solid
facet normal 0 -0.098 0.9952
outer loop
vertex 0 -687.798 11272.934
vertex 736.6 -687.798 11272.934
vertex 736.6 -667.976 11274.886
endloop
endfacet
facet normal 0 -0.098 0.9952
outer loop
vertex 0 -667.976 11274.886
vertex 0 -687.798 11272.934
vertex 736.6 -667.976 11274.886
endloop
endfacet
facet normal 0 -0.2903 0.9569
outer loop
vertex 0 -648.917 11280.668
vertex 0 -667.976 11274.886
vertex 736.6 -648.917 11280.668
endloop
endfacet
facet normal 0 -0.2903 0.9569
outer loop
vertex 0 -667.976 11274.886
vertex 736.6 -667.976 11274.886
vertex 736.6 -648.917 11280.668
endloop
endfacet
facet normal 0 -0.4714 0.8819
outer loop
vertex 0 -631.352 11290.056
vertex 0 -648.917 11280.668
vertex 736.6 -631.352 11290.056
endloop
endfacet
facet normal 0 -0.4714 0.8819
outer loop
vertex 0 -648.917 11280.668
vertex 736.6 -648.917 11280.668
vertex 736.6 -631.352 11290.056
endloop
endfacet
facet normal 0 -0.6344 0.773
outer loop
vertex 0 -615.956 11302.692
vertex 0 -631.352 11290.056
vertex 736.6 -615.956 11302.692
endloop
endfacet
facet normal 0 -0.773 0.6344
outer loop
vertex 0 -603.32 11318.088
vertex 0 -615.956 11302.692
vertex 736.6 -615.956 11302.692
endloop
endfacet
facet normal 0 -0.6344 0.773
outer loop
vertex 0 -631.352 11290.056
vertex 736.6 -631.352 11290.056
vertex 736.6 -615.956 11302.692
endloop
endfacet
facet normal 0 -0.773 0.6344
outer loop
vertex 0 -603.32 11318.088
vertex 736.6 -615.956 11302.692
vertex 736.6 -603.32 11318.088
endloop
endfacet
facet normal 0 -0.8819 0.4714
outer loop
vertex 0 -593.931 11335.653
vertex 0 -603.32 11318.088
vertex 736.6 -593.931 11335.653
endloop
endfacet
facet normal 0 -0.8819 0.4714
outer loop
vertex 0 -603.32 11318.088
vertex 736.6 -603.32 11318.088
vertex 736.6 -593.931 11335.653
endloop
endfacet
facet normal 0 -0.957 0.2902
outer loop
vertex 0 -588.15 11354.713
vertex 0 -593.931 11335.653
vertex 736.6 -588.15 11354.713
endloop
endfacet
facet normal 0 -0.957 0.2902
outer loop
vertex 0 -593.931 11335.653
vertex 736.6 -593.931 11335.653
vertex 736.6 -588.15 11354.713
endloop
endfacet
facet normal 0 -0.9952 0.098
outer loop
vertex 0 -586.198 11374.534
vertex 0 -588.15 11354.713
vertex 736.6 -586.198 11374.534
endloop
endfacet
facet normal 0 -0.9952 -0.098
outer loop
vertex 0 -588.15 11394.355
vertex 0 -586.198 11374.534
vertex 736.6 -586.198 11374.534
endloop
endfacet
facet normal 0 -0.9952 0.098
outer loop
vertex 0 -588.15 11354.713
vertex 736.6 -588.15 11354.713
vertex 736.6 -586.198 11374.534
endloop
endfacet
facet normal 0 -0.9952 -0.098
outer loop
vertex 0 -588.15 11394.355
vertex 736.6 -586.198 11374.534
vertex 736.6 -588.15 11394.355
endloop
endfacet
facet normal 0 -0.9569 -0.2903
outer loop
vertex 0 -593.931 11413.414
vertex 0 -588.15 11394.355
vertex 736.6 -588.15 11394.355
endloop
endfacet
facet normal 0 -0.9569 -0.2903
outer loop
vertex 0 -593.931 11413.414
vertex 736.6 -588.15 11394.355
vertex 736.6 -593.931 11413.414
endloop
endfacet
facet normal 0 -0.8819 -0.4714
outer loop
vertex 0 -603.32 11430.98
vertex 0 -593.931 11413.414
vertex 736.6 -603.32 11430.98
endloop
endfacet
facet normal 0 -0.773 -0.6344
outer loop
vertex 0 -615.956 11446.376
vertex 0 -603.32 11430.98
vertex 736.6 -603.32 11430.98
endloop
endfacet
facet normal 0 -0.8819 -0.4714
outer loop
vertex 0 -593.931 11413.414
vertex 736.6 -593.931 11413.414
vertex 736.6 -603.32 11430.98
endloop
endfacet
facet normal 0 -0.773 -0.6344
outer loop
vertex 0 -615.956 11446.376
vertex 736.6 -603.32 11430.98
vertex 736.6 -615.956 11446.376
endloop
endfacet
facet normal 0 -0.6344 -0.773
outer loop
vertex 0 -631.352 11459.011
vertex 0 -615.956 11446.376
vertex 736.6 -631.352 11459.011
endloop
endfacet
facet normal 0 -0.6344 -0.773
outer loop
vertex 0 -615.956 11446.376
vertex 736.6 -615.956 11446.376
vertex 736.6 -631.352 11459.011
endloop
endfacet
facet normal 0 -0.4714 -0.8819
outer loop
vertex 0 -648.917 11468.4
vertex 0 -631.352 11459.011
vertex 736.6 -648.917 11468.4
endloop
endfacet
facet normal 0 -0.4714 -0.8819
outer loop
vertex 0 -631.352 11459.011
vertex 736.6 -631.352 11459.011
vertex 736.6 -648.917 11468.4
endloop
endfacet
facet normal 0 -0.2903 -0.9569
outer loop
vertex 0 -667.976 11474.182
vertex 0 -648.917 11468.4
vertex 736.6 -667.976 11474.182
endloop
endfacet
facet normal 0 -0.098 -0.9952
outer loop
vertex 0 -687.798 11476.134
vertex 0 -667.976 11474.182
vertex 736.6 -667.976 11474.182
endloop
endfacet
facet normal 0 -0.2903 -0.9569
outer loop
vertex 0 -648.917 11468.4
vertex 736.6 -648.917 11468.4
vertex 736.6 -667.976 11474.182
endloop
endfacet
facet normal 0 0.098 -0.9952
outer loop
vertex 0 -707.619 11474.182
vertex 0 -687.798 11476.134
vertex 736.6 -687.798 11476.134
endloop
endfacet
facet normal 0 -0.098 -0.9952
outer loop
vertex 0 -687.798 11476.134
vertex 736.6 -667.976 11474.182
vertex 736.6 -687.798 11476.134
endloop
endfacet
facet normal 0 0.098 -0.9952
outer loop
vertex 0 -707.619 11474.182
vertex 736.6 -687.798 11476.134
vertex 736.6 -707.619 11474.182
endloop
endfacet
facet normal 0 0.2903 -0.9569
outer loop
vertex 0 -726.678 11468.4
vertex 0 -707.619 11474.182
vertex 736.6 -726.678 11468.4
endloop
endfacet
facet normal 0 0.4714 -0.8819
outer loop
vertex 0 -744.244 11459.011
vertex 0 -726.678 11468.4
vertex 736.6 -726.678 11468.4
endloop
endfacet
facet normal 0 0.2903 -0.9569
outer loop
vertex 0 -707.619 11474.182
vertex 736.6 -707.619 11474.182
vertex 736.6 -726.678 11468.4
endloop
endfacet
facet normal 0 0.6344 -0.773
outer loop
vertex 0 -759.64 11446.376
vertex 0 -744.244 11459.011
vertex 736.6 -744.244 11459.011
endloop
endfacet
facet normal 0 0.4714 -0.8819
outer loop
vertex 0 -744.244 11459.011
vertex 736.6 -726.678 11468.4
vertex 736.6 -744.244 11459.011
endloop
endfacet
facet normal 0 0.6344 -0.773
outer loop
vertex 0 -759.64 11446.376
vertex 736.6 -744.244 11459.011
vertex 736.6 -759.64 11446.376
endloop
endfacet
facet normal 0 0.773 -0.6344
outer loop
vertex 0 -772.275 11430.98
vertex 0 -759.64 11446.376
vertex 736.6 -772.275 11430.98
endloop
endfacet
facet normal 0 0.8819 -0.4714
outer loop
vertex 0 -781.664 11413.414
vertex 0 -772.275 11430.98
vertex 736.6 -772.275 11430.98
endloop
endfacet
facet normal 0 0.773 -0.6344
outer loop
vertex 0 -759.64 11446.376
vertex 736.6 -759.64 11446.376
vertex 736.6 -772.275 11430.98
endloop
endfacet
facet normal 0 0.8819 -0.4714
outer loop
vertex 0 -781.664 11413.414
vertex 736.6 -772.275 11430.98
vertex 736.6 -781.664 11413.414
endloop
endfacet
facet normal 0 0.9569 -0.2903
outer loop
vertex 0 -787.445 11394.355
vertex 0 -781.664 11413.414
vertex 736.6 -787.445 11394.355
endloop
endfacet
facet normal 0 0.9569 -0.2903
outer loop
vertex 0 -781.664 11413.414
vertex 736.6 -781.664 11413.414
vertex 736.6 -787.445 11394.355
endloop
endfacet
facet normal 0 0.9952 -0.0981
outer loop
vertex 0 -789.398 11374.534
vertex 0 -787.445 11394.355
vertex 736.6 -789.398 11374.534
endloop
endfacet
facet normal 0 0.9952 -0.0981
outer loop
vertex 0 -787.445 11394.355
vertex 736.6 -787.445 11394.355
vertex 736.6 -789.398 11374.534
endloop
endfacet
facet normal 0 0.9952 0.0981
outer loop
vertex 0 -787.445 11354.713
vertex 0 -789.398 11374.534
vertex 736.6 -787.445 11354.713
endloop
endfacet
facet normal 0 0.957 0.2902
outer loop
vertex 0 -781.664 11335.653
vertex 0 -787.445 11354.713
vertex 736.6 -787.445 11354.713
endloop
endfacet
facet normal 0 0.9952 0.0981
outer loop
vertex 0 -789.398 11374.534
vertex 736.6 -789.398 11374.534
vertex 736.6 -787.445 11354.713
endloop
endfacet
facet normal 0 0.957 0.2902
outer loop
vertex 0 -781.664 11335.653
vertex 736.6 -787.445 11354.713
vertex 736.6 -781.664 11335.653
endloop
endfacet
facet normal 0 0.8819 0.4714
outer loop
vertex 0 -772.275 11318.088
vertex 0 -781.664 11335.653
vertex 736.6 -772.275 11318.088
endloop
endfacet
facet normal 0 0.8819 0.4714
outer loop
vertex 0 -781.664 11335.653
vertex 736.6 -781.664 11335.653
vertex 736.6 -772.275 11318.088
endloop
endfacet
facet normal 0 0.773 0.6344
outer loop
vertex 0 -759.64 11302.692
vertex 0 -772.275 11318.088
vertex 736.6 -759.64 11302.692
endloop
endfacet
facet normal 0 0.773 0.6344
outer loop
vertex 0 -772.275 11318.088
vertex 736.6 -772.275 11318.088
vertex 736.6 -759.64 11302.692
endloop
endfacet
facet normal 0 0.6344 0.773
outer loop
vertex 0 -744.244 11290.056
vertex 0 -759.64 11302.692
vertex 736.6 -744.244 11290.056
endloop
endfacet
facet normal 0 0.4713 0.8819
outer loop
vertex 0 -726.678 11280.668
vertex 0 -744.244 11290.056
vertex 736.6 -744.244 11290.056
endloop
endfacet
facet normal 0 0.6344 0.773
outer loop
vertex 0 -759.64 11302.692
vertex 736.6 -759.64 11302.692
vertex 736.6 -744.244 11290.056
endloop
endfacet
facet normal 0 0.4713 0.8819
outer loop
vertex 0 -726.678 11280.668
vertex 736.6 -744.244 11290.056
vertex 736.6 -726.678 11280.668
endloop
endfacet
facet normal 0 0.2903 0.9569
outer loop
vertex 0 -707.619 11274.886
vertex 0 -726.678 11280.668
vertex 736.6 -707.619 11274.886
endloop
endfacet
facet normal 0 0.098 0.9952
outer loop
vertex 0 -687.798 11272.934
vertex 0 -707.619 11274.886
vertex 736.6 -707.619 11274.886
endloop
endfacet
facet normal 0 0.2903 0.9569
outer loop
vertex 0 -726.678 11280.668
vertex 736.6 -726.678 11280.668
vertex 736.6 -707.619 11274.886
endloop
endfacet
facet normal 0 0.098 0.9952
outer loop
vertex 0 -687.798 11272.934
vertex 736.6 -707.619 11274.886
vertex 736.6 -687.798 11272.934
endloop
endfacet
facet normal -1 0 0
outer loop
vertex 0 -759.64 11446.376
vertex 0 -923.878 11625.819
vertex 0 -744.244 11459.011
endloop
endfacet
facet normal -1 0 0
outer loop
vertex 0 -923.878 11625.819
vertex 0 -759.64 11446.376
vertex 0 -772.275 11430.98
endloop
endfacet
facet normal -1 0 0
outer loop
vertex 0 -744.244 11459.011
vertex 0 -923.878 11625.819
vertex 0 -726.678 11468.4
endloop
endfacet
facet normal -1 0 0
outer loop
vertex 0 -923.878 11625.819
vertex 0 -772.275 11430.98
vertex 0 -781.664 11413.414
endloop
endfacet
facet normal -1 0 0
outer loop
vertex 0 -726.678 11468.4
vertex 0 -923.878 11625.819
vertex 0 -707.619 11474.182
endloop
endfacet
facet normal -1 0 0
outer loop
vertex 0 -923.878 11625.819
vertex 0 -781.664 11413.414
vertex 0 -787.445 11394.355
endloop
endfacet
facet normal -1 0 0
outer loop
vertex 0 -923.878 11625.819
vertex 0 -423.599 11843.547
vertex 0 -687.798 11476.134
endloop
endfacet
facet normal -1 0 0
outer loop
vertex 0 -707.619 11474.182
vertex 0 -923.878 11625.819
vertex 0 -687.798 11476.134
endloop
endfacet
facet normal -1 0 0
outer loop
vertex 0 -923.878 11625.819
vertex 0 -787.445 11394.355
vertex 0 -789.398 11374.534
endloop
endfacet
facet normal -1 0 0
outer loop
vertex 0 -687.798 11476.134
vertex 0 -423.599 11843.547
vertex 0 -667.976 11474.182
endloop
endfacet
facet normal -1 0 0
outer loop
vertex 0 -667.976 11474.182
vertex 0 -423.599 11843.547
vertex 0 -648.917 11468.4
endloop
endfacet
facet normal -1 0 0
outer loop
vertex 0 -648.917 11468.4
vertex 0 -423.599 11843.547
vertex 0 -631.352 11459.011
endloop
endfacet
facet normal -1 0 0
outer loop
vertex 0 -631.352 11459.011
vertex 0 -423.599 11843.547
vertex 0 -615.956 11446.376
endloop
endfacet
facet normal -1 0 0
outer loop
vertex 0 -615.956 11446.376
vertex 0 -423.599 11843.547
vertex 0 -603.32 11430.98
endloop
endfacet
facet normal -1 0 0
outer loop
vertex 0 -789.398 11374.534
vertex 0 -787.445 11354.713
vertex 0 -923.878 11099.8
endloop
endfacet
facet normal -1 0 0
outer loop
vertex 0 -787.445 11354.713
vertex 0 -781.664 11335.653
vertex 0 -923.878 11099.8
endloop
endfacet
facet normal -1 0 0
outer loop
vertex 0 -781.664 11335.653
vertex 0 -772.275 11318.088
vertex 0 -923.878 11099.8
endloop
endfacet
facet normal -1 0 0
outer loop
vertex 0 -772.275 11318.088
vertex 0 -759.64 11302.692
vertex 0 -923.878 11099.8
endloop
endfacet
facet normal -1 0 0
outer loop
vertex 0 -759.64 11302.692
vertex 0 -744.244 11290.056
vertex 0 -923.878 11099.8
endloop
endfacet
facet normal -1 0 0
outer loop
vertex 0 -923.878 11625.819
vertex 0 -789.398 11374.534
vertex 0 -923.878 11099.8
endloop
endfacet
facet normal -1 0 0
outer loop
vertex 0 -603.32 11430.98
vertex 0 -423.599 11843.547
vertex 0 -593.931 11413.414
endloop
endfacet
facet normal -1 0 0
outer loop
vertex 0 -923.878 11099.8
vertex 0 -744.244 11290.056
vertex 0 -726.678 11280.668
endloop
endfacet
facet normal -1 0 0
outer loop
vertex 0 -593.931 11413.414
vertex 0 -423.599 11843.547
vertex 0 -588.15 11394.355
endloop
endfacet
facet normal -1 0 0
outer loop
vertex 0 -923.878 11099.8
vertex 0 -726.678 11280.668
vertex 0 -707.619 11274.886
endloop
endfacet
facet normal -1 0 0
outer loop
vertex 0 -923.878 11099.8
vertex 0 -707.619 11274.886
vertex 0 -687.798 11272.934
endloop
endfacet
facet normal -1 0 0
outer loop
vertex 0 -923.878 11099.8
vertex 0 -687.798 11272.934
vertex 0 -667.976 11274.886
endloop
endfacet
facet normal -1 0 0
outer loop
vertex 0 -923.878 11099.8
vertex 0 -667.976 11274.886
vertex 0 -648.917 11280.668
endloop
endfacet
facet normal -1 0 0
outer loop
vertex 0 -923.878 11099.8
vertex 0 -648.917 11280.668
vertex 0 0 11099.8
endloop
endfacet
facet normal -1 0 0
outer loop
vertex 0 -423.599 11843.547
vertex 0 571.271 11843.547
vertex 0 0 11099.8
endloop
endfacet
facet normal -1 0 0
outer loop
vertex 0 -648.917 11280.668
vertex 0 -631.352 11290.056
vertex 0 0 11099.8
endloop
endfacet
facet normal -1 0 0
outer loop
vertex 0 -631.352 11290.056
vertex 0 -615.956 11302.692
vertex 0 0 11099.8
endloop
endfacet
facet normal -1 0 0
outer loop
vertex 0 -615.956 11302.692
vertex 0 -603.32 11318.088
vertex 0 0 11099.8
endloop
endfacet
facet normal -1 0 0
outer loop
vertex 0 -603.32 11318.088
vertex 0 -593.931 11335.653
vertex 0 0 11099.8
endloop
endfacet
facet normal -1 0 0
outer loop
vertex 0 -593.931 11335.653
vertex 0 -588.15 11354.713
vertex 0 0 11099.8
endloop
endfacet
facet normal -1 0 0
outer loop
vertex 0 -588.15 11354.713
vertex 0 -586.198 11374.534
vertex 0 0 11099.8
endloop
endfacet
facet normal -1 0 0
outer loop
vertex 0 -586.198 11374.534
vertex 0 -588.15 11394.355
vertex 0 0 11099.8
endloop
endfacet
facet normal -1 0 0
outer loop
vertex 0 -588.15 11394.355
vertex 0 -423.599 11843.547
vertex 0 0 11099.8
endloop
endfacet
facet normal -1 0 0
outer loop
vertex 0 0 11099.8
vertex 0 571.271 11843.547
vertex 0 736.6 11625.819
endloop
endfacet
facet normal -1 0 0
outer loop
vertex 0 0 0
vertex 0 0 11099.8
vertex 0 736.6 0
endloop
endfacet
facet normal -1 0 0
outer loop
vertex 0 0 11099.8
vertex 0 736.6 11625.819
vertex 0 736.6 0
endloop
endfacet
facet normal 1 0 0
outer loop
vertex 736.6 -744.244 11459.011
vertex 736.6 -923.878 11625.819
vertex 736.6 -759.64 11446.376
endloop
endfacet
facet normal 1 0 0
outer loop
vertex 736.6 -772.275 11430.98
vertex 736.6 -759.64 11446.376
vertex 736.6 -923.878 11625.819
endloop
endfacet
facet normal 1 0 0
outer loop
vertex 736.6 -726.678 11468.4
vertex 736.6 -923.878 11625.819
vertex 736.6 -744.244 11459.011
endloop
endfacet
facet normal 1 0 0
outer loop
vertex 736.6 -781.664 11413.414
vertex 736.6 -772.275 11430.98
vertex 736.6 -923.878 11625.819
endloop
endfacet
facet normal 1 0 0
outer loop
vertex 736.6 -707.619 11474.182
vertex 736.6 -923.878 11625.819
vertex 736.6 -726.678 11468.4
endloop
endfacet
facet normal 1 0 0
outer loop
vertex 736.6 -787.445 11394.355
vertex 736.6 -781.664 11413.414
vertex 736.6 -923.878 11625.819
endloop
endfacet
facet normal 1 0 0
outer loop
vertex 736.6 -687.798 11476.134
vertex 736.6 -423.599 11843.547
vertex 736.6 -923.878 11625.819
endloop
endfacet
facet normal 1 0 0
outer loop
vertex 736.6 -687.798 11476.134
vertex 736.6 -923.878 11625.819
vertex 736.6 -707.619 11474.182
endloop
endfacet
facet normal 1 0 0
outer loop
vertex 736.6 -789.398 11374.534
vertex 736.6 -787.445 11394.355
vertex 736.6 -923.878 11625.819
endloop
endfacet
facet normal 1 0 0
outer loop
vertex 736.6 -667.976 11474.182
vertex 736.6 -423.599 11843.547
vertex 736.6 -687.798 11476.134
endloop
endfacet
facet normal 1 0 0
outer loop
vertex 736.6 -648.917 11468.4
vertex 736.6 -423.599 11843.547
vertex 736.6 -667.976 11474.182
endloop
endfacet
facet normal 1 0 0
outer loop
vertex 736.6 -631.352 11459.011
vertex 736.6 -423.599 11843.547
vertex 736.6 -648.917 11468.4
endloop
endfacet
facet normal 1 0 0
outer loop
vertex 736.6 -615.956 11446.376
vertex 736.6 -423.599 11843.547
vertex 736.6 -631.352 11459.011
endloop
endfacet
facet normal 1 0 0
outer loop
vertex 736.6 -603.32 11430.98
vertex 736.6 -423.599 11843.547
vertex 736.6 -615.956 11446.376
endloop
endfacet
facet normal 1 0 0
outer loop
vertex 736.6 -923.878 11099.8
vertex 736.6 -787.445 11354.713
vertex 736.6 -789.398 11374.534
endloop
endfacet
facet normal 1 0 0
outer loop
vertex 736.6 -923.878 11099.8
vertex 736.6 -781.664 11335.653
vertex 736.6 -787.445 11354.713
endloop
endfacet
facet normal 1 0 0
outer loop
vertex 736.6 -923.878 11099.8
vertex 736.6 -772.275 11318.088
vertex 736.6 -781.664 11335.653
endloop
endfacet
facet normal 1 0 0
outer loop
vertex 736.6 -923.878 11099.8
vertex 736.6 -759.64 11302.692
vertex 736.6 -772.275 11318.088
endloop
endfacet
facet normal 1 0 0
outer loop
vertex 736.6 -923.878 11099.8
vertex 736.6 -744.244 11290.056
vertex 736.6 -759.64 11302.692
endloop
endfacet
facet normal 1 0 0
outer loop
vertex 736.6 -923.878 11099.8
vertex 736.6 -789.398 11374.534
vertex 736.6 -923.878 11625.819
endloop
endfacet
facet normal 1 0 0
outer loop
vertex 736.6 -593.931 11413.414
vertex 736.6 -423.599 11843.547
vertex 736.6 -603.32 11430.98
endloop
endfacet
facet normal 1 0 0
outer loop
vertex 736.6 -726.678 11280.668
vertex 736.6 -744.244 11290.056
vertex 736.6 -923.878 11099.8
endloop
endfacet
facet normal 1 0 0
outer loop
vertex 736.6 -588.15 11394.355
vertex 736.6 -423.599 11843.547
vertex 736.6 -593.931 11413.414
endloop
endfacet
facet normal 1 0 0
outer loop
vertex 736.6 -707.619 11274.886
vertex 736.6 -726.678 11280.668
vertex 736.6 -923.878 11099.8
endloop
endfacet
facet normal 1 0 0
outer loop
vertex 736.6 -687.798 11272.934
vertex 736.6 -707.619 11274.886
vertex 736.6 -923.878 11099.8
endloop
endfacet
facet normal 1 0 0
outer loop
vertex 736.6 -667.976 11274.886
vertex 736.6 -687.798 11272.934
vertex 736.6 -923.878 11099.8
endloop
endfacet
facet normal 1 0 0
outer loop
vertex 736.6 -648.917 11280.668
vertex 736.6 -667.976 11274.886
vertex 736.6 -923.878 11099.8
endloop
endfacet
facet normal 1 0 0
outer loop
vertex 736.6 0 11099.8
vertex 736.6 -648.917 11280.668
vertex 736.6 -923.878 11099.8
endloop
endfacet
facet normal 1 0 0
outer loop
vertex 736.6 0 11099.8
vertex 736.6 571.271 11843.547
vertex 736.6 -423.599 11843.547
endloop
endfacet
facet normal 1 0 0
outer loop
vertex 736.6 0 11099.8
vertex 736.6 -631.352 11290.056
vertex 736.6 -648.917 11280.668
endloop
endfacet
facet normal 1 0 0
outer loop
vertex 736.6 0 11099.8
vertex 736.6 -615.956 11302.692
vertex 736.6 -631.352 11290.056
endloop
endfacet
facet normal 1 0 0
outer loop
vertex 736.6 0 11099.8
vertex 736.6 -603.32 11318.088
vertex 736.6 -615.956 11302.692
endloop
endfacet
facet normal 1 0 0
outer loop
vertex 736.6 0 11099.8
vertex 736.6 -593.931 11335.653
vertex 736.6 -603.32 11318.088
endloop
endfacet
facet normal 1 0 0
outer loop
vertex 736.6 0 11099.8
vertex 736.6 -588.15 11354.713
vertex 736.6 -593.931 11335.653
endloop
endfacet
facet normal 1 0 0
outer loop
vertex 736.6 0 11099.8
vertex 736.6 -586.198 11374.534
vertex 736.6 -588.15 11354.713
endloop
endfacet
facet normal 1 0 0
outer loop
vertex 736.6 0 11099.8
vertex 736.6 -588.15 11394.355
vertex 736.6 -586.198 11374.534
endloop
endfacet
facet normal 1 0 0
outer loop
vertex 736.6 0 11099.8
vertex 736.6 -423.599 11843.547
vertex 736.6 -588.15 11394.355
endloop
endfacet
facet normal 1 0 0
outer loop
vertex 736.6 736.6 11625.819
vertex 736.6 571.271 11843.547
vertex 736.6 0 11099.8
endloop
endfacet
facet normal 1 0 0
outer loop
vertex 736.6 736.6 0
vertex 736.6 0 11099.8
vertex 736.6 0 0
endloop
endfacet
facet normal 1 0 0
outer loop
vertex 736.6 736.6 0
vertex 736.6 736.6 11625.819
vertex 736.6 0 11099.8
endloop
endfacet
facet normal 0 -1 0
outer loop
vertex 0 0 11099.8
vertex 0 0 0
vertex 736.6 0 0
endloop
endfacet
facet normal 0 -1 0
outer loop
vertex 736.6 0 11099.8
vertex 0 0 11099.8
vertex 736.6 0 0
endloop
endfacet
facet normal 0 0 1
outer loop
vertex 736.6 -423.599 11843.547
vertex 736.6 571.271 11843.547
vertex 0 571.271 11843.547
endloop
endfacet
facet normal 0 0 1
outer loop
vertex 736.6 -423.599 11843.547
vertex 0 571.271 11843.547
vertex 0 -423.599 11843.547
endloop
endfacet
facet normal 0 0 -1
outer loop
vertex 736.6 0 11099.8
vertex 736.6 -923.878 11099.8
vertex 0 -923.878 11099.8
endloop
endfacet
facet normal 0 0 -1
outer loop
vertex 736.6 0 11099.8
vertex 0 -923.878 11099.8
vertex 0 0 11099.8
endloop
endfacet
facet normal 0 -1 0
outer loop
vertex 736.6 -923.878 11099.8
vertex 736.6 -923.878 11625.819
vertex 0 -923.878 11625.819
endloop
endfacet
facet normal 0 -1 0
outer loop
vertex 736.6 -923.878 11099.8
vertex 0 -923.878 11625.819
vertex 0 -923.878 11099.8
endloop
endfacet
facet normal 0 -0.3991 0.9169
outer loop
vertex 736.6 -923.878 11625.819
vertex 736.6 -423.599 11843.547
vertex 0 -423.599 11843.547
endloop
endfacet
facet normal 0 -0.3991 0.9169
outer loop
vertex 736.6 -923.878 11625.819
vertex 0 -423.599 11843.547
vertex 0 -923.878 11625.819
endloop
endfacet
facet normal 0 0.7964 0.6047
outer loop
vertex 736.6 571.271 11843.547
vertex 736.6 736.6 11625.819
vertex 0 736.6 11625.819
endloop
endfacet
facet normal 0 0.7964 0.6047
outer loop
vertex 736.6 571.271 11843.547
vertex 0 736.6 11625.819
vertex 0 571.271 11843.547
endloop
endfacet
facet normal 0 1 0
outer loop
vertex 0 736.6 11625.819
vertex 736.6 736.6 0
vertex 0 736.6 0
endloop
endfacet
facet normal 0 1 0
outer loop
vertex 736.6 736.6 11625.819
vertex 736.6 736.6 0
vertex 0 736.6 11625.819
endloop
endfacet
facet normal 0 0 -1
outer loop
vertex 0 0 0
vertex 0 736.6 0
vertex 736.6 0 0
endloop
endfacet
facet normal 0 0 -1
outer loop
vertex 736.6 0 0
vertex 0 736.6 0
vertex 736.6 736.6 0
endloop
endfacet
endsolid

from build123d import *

# Parameters (mm, degrees)
SKETCH2_W           = 736.6
SKETCH2_H           = 736.6
BOSS_EXTRUDE1_DEPTH = 11099.8
SKETCH3_R           = 101.6
BOSS_EXTRUDE2_DEPTH = 736.6


with BuildPart() as part:
    # Sketch2 → Boss-Extrude1 (new body)
    with BuildSketch(Plane.XY):
        with Locations((368.3, 368.3)):
            Rectangle(SKETCH2_W, SKETCH2_H)
    extrude(amount=BOSS_EXTRUDE1_DEPTH)

    # Sketch3 → Boss-Extrude2 (add)
    with BuildSketch(Plane(origin=(736.6, 0, 0), x_dir=(0, 0, -1), z_dir=(1, 0, 0))):
        Polygon((-11099.8, 736.6), (-11625.819203205, 736.6), (-11843.547005601, 571.270728239), (-11843.547005601, -423.59872011), (-11625.819203205, -923.877591133), (-11099.8, -923.877591133), (-11099.8, 0), align=None)
        with Locations((-11374.533737558, -687.797576453)):
            Circle(SKETCH3_R, mode=Mode.SUBTRACT)
    extrude(amount=-BOSS_EXTRUDE2_DEPTH)


solid = part.part
